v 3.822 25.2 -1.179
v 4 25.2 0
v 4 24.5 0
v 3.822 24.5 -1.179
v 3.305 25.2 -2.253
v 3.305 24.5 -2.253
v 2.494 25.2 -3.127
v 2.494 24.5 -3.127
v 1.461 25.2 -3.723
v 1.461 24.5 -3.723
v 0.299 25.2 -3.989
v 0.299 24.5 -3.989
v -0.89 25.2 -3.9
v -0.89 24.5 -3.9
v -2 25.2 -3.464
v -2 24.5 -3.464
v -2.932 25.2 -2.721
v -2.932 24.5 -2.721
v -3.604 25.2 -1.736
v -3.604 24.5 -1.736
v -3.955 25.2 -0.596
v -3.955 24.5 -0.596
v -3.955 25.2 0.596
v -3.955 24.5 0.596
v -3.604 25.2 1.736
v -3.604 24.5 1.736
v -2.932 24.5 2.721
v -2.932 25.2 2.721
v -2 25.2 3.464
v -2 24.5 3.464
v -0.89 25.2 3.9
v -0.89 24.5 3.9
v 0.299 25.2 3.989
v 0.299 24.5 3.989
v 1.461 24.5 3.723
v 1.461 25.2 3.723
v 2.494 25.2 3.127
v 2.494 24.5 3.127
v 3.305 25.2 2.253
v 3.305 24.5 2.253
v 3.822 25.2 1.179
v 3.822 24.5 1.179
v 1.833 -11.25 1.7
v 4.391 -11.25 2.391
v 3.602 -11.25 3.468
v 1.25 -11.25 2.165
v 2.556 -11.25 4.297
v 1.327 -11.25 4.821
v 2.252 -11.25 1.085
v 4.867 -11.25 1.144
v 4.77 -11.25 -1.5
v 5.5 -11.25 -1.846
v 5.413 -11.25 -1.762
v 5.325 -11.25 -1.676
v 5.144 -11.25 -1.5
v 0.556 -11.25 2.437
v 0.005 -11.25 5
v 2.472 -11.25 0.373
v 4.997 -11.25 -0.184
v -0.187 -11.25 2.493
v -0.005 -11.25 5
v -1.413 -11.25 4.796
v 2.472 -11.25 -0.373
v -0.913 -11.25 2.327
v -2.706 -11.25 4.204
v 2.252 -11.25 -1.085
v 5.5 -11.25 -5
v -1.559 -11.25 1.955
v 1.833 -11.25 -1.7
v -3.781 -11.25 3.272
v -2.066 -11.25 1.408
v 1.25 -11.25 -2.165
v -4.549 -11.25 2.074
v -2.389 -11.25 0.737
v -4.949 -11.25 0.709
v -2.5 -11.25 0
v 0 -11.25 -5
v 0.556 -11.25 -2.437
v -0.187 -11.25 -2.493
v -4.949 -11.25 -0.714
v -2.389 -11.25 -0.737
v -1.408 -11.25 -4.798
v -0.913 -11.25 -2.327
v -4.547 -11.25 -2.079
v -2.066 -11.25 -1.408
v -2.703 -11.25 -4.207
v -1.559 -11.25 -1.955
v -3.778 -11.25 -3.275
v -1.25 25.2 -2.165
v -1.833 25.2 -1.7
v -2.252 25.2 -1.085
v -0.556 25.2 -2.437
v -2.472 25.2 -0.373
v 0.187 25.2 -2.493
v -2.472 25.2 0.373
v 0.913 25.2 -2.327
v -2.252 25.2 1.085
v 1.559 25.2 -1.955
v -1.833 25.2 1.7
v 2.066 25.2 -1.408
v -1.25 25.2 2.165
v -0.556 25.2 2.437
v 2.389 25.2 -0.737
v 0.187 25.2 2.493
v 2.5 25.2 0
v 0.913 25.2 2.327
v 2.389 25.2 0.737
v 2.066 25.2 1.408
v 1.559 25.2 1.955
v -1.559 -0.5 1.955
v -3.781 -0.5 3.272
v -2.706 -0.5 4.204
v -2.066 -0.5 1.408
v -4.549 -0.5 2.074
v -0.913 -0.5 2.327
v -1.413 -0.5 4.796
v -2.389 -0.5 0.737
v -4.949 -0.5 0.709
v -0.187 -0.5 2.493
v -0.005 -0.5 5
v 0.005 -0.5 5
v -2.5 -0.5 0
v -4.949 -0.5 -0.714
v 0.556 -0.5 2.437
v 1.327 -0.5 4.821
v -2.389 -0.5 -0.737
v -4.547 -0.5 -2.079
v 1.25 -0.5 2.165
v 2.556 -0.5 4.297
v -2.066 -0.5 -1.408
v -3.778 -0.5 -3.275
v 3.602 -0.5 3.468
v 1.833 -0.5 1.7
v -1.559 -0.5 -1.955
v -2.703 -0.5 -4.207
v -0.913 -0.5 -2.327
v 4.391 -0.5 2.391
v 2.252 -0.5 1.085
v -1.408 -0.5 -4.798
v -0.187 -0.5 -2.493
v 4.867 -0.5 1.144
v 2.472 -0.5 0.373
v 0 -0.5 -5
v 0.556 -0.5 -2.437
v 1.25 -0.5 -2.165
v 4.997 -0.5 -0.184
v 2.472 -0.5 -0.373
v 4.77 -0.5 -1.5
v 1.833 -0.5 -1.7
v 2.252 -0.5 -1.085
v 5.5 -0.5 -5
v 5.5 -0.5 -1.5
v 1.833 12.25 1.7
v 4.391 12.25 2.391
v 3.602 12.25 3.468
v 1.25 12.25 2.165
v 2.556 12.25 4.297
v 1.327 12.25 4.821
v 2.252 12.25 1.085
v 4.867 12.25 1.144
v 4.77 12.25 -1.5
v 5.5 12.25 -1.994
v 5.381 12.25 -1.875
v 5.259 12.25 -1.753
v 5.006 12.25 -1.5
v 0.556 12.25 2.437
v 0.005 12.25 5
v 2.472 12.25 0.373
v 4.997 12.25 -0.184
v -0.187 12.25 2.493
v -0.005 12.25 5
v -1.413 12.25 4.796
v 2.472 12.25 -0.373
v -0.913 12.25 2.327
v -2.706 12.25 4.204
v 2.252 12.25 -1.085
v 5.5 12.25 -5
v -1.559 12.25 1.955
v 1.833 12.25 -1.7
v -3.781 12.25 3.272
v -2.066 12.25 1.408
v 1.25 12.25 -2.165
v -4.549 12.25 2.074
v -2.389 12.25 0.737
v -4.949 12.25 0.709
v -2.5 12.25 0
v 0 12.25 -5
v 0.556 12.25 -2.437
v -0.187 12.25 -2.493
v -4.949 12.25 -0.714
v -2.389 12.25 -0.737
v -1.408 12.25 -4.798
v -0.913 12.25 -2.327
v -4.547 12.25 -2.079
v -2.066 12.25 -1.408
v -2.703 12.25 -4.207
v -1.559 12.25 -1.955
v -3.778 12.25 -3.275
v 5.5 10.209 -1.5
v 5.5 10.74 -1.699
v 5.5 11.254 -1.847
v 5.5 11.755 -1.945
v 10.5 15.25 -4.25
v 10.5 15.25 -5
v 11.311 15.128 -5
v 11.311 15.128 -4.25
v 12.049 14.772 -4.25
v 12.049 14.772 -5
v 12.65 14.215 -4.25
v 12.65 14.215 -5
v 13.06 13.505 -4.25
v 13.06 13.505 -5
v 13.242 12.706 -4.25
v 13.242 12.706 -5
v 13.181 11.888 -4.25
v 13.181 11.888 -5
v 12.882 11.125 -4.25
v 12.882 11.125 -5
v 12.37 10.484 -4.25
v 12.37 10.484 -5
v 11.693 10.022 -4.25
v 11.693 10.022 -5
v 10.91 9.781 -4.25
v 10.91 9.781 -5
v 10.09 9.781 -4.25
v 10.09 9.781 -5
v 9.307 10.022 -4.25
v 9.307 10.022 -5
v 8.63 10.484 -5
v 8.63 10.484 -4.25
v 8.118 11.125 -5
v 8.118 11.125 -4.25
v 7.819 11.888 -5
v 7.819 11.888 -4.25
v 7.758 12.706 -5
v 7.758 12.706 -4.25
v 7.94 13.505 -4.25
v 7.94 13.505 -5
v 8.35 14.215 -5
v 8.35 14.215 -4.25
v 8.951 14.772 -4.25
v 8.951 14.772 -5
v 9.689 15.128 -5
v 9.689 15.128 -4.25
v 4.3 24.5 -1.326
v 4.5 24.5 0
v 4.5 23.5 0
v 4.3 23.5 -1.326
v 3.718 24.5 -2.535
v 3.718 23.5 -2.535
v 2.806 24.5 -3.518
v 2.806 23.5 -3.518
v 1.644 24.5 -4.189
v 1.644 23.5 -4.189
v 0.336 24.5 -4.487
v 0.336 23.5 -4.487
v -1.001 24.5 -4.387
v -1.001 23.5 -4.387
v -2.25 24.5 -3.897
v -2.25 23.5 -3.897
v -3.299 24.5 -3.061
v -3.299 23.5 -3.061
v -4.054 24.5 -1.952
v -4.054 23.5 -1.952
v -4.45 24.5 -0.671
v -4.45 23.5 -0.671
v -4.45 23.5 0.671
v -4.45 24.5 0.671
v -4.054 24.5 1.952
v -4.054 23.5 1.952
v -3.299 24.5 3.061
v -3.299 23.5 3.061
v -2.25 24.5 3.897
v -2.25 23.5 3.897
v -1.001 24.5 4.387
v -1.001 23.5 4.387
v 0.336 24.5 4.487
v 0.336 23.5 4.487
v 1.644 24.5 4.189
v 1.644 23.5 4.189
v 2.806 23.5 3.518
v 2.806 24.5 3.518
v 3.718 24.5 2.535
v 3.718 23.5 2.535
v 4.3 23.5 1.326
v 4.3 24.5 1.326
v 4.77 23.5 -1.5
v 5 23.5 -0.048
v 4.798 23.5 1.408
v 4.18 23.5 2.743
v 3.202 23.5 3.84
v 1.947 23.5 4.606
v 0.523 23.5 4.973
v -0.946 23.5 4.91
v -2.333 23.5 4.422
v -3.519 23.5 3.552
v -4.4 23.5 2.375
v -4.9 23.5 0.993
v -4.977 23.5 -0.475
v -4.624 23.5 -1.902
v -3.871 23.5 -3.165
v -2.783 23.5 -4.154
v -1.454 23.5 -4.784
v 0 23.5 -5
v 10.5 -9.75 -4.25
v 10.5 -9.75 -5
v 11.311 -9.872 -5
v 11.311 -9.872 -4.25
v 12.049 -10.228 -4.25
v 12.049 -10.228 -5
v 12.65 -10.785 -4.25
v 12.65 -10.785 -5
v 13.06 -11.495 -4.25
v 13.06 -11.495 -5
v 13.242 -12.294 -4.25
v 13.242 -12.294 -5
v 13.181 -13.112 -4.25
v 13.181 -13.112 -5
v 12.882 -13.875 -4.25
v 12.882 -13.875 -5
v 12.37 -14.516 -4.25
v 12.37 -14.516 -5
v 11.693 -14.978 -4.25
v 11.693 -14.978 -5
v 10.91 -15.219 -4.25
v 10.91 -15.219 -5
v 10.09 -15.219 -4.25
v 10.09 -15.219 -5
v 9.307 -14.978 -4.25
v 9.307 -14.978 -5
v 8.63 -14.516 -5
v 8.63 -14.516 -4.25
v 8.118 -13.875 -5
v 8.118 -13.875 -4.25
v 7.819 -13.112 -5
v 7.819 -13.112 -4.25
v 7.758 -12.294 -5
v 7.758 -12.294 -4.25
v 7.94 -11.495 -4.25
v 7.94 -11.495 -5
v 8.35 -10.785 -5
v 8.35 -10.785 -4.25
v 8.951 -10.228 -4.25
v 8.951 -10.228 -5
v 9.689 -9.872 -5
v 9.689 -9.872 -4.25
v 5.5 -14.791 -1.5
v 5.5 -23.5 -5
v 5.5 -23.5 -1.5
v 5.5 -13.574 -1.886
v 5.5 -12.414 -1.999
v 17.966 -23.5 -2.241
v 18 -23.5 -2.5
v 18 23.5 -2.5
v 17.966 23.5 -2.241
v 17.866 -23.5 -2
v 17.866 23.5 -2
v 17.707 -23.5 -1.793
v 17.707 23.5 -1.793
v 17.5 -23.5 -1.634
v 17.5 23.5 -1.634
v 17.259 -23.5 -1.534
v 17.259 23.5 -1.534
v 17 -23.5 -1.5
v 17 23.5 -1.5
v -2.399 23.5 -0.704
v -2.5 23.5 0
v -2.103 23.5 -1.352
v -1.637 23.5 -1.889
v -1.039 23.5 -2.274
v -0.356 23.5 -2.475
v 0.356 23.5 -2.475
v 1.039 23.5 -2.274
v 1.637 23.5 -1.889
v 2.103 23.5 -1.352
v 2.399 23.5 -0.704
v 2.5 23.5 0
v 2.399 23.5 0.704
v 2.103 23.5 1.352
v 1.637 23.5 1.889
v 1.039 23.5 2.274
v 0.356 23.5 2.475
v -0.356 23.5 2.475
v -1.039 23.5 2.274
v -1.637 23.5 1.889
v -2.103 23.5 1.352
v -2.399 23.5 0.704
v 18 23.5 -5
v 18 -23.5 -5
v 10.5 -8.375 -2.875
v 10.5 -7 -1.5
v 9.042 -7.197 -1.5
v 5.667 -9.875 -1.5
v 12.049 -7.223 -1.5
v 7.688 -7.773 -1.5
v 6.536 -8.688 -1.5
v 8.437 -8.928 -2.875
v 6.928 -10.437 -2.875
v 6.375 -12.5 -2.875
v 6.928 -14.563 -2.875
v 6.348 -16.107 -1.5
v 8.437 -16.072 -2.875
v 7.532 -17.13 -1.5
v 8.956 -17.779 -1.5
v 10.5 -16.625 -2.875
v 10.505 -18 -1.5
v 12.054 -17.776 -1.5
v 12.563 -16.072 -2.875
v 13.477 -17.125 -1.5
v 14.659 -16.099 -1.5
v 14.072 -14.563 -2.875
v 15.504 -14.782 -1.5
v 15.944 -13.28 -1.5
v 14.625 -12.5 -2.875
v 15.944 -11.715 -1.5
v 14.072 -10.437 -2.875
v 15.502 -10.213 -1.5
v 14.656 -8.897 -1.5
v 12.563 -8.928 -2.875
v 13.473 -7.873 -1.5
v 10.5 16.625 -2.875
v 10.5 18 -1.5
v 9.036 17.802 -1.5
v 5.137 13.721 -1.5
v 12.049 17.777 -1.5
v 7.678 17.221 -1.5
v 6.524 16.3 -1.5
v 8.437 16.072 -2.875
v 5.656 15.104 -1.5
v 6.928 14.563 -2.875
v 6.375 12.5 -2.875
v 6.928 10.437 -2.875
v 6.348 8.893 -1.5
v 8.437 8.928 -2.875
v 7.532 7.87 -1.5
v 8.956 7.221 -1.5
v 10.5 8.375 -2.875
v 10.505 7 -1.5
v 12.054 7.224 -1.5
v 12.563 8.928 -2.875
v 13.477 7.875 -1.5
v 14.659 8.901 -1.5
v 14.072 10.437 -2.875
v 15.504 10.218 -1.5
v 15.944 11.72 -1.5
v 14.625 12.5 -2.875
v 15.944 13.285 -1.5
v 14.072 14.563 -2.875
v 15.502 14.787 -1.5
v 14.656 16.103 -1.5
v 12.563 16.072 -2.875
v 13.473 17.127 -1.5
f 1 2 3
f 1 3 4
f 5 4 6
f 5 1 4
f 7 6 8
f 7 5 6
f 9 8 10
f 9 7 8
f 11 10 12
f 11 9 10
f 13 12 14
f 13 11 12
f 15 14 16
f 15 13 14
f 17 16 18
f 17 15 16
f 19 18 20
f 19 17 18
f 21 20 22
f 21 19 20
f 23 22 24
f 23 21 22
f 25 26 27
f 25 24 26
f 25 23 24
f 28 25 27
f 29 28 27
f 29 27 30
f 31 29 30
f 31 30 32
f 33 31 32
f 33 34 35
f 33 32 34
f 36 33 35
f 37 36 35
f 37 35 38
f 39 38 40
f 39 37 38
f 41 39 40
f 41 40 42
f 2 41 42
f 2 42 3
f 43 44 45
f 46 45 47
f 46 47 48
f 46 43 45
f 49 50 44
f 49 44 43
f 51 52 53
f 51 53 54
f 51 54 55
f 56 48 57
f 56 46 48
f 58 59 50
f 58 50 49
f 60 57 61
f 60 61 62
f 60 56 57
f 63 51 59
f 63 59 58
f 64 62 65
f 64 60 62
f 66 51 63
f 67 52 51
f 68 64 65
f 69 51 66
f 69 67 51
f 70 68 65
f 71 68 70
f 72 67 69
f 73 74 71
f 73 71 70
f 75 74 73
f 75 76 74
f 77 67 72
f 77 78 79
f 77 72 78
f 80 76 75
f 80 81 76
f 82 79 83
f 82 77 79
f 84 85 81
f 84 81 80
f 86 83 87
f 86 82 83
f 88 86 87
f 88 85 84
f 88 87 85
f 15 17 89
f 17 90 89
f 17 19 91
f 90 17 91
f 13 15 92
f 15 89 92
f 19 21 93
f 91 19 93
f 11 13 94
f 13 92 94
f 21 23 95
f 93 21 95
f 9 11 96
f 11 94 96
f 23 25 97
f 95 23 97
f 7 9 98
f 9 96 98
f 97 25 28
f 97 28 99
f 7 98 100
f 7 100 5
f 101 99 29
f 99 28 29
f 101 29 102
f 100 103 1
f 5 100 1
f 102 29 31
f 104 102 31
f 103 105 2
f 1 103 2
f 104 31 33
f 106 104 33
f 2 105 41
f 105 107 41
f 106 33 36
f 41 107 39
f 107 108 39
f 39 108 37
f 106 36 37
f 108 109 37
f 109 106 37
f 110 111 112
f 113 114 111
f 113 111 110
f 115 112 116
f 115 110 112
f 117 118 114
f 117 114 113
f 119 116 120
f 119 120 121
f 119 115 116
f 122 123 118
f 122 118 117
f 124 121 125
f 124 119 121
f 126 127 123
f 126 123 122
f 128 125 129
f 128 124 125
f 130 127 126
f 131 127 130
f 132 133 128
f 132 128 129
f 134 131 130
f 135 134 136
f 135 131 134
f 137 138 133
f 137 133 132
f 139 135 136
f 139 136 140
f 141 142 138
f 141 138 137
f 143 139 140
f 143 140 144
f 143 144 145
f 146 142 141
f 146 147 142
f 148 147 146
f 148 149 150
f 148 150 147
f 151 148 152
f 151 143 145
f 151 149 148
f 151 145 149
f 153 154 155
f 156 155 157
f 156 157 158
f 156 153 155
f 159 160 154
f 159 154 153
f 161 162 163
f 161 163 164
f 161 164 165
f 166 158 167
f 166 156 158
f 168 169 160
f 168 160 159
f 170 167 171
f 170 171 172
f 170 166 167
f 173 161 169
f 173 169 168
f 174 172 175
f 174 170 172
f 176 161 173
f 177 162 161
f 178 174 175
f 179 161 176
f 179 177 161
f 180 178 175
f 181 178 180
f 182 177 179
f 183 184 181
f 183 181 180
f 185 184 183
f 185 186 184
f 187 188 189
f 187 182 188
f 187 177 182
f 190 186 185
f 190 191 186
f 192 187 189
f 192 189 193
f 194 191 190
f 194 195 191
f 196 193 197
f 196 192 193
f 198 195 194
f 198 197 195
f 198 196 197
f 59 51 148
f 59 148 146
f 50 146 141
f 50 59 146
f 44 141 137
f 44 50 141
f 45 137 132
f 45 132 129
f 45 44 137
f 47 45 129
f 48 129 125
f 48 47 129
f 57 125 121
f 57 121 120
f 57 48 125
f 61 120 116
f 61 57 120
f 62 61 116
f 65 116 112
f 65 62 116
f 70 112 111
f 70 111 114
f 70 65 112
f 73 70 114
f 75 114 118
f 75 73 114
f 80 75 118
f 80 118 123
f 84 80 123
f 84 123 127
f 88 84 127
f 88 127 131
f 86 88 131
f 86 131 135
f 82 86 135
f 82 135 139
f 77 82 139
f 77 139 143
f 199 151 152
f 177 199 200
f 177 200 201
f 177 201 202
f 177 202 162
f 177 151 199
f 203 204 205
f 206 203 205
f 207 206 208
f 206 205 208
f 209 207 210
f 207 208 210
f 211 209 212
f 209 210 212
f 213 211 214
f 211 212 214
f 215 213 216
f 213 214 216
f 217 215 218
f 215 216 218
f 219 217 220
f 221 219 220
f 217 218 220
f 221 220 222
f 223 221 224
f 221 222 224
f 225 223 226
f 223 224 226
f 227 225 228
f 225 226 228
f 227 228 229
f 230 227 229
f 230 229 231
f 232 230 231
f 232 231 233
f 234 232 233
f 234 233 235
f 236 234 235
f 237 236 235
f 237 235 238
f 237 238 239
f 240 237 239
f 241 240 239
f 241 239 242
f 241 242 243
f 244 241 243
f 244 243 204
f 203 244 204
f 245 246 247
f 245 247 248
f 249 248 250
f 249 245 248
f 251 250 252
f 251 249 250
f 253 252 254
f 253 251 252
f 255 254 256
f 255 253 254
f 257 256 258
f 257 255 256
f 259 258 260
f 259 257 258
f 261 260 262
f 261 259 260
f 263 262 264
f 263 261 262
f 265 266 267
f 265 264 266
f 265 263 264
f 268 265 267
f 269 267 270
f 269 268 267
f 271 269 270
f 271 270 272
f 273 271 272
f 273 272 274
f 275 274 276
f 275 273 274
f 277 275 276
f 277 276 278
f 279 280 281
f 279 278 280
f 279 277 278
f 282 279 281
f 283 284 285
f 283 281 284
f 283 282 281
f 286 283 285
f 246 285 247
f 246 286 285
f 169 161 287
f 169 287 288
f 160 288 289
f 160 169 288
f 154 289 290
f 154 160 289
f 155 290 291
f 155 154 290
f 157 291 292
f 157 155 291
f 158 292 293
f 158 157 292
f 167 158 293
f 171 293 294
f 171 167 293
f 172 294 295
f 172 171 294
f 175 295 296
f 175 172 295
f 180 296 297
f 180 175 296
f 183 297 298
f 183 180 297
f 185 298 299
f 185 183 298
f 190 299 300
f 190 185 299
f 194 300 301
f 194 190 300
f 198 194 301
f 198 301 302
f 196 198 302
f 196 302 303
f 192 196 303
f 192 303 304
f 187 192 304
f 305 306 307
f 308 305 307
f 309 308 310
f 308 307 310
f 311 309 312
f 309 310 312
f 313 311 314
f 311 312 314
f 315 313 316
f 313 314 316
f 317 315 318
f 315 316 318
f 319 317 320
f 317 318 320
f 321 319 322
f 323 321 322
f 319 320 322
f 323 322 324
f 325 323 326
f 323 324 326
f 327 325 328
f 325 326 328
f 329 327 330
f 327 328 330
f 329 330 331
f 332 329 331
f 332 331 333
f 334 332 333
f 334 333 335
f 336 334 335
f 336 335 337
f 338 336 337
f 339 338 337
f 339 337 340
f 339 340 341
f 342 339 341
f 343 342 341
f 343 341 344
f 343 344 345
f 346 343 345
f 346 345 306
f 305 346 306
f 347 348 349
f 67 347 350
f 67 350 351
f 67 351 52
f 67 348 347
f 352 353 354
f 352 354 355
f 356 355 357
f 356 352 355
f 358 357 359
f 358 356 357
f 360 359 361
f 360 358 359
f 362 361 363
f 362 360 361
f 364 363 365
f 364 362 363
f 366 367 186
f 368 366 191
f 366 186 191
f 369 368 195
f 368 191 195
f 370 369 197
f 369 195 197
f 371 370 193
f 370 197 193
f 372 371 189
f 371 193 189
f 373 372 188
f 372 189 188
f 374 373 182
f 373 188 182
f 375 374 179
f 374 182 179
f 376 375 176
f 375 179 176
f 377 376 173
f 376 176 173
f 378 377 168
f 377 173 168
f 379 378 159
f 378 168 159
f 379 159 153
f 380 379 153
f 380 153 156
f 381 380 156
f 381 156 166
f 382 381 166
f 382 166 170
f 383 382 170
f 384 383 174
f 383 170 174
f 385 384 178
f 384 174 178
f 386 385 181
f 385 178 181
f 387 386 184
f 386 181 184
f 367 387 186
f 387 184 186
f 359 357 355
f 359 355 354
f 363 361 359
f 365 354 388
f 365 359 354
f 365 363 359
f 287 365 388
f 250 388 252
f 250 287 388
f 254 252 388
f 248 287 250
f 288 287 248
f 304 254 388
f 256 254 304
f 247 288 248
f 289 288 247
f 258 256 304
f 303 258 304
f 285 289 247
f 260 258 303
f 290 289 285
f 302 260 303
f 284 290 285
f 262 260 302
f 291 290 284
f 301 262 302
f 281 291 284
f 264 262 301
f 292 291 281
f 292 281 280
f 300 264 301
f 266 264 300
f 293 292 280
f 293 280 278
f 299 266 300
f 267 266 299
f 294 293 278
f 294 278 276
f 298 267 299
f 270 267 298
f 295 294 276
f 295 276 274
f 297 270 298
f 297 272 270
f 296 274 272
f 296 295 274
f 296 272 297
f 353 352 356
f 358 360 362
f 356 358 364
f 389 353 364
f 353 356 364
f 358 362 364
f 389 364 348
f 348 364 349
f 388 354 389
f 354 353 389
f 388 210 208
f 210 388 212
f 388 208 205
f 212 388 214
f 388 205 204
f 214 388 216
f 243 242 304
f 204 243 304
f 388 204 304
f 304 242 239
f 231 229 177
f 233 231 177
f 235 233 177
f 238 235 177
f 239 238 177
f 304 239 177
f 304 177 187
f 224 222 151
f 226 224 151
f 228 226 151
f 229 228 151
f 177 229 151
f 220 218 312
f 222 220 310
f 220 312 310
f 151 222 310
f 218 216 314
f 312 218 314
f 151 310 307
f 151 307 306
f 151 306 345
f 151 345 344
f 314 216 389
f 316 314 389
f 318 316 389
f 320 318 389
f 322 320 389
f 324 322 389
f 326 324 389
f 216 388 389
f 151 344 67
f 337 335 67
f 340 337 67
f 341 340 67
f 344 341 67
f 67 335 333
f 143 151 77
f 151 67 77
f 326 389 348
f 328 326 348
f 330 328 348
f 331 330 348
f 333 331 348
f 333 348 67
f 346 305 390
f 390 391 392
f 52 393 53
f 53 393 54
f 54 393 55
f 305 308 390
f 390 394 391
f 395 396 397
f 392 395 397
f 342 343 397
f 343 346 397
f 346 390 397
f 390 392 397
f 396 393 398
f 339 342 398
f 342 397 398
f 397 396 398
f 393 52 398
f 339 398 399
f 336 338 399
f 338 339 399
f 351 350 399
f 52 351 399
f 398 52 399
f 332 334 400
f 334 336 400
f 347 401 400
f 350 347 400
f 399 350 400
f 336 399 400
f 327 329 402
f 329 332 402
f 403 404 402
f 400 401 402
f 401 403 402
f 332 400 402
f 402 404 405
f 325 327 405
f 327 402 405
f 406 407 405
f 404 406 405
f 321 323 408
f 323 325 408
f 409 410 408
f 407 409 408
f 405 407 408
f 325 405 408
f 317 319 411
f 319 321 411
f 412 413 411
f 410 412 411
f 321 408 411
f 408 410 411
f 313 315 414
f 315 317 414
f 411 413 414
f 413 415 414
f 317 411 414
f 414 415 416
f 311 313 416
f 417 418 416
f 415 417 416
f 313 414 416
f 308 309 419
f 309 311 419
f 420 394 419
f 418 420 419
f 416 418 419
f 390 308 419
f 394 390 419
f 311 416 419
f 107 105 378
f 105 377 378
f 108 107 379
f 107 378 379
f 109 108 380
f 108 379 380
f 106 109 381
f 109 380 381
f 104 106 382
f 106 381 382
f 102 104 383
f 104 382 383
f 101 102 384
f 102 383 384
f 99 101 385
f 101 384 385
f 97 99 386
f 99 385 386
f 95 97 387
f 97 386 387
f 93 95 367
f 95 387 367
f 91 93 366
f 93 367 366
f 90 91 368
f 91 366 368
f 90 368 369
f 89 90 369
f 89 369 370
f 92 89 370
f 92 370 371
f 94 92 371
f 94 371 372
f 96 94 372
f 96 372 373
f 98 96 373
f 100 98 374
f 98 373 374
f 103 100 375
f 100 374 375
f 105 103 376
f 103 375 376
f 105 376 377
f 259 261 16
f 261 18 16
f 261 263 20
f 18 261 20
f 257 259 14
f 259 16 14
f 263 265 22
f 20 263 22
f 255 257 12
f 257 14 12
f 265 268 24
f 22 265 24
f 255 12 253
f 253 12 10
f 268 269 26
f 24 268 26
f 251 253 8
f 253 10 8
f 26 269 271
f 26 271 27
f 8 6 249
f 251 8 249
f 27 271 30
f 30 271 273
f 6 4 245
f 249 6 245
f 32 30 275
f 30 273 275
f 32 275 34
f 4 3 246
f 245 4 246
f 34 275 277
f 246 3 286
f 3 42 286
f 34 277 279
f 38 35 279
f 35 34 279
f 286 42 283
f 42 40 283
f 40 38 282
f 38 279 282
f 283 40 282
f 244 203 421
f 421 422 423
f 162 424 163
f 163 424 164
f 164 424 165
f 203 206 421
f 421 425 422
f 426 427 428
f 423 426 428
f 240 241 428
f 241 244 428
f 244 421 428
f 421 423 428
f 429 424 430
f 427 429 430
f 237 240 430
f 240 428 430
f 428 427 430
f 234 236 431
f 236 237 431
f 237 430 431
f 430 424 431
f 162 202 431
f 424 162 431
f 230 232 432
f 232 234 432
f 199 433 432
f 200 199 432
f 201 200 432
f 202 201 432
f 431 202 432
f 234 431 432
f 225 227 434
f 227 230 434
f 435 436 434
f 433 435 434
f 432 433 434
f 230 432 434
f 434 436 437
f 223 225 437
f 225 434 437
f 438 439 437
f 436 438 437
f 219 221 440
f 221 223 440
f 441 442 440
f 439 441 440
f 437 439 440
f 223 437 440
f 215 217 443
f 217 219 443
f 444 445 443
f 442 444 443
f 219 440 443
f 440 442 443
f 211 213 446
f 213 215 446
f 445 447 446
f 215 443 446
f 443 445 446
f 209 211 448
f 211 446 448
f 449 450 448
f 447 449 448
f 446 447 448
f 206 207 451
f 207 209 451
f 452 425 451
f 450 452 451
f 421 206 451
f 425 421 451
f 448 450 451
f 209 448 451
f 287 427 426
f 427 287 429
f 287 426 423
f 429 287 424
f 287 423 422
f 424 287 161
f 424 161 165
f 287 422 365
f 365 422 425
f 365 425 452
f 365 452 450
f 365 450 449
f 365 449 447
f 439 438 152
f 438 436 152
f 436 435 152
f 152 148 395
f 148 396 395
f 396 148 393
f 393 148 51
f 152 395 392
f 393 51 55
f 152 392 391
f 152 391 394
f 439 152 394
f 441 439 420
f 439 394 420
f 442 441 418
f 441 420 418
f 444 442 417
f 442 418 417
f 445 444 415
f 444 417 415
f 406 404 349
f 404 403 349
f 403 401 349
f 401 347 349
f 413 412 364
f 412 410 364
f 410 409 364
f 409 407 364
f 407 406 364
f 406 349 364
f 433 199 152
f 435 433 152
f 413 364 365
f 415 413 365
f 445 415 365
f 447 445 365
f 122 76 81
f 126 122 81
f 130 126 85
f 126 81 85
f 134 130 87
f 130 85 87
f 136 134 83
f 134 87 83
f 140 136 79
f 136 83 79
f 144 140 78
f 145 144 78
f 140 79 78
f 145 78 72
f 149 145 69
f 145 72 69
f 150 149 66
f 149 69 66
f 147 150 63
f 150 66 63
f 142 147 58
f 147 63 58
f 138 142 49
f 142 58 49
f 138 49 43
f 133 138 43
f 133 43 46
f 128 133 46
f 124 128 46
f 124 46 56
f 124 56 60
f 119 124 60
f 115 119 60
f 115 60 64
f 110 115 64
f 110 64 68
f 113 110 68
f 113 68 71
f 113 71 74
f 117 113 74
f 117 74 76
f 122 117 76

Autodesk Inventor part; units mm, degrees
sketch "Sketch_1" plane through (0, 0, 0) normal (0, 1, 0) x (-1, 0, 0)
  arc A0 (0, -5) -> (-4.7697, -1.5) centre (0, 0) ccw
  line L0 (-4.7697, -1.5) -> (-17, -1.5)
  arc A1 (-17, -1.5) -> (-18, -2.5) centre (-17, -2.5) ccw
  line L1 (-18, -2.5) -> (-18, -5)
  line L2 (-18, -5) -> (0, -5)
  circle A2 centre (0, 0) radius 2.5
extrude "Extrusion1" add sketch "Sketch_1" along normal mid plane 47
sketch "Sketch_2" plane through (0, 0, 0) normal (0, 0, 1) x (1, 0, 0)
  line L0 (-10, -23.5) -> (5.5, -23.5)
  line L1 (5.5, -23.5) -> (5.5, -11.25)
  line L2 (5.5, -11.25) -> (-5, -11.25)
  line L3 (-5, -11.25) -> (-5, -0.5)
  line L4 (-5, -0.5) -> (5.5, -0.5)
  line L5 (5.5, -0.5) -> (5.5, 12.25)
  line L6 (5.5, 12.25) -> (-5, 12.25)
  line L7 (-5, 12.25) -> (-5, 23.5)
  line L8 (-5, 23.5) -> (-10, 23.5)
  line L9 (-10, 23.5) -> (-10, -23.5)
extrude "Extrusion2" cut sketch "Sketch_2" along normal mid plane 10
sketch "Sketch_4" plane through (10.5, 0, 0) normal (1, 0, 0) x (0, 0, -1)
  line L0 (5, 12.5) -> (1.5, 12.5)
  line L1 (1.5, 12.5) -> (1.5, 18)
  line L2 (1.5, 18) -> (4.25, 15.25)
  line L3 (4.25, 15.25) -> (5, 15.25)
  line L4 (5, 15.25) -> (5, 12.5)
  line L5 (5, 12.5) -> (1.5, 12.5)
revolve "Revolution1" cut sketch "Sketch_4" angle 360 about axis through (10.5, 12.5, -5) along (0, 0, -1)
sketch "Sketch_5" plane through (10.5, 0, 0) normal (1, 0, 0) x (0, 0, -1)
  line L0 (5, -12.5) -> (1.5, -12.5)
  line L1 (1.5, -12.5) -> (1.5, -7)
  line L2 (1.5, -7) -> (4.25, -9.75)
  line L3 (4.25, -9.75) -> (5, -9.75)
  line L4 (5, -9.75) -> (5, -12.5)
  line L5 (5, -12.5) -> (1.5, -12.5)
revolve "Revolution2" cut sketch "Sketch_5" angle 360 about axis through (10.5, -12.5, -5) along (0, 0, -1)
sketch "Sketch_10" plane through (0, 0, 0) normal (0, 0, 1) x (1, 0, 0)
  line L0 (0, 23.5) -> (0, 25.2)
  line L1 (2.5, 23.5) -> (4.5, 23.5)
  line L2 (4.5, 23.5) -> (4.5, 24.5)
  line L3 (4.5, 24.5) -> (4, 24.5)
  line L4 (4, 24.5) -> (4, 25.2)
  line L5 (4, 25.2) -> (2.5, 25.2)
  line L6 (2.5, 25.2) -> (2.5, 23.5)
revolve "Revolution3" add sketch "Sketch_10" angle 360 about axis through (0, 23.5, 0) along (0, -1, 0)
ref_plane "cp_XY" through (0, 0, 0) normal (0, -1, 0) x (1, 0, 0)
ref_plane "cp_YZ" through (0, 0, 0) normal (1, 0, 0) x (0, 0, 1)
ref_plane "cp_ZX" through (0, 0, 0) normal (0, 0, 1) x (0, -1, 0)
ref_plane "bolt1_XY" through (10.5, 12.5, -4.25) normal (0, 0, 1) x (1, 0, 0)
ref_plane "bolt1_YZ" through (10.5, 12.5, -4.25) normal (1, 0, 0) x (0, 1, 0)
ref_plane "bolt1_ZX" through (10.5, 12.5, -4.25) normal (0, 1, 0) x (0, 0, 1)
ref_plane "bolt2_XY" through (10.5, -12.5, -4.25) normal (0, 0, 1) x (1, 0, 0)
ref_plane "bolt2_YZ" through (10.5, -12.5, -4.25) normal (1, 0, 0) x (0, 1, 0)
ref_plane "bolt2_ZX" through (10.5, -12.5, -4.25) normal (0, 1, 0) x (0, 0, 1)
ref_plane "nut1_XY" through (10.5, 12.5, -5) normal (0, 0, 1) x (1, 0, 0)
ref_plane "nut1_YZ" through (10.5, 12.5, -5) normal (1, 0, 0) x (0, 1, 0)
ref_plane "nut1_ZX" through (10.5, 12.5, -5) normal (0, 1, 0) x (0, 0, 1)
ref_plane "nut2_XY" through (10.5, -12.5, -5) normal (0, 0, 1) x (1, 0, 0)
ref_plane "nut2_YZ" through (10.5, -12.5, -5) normal (1, 0, 0) x (0, 1, 0)
ref_plane "nut2_ZX" through (10.5, -12.5, -5) normal (0, 1, 0) x (0, 0, 1)
properties part number "HHPMGS5p2"
